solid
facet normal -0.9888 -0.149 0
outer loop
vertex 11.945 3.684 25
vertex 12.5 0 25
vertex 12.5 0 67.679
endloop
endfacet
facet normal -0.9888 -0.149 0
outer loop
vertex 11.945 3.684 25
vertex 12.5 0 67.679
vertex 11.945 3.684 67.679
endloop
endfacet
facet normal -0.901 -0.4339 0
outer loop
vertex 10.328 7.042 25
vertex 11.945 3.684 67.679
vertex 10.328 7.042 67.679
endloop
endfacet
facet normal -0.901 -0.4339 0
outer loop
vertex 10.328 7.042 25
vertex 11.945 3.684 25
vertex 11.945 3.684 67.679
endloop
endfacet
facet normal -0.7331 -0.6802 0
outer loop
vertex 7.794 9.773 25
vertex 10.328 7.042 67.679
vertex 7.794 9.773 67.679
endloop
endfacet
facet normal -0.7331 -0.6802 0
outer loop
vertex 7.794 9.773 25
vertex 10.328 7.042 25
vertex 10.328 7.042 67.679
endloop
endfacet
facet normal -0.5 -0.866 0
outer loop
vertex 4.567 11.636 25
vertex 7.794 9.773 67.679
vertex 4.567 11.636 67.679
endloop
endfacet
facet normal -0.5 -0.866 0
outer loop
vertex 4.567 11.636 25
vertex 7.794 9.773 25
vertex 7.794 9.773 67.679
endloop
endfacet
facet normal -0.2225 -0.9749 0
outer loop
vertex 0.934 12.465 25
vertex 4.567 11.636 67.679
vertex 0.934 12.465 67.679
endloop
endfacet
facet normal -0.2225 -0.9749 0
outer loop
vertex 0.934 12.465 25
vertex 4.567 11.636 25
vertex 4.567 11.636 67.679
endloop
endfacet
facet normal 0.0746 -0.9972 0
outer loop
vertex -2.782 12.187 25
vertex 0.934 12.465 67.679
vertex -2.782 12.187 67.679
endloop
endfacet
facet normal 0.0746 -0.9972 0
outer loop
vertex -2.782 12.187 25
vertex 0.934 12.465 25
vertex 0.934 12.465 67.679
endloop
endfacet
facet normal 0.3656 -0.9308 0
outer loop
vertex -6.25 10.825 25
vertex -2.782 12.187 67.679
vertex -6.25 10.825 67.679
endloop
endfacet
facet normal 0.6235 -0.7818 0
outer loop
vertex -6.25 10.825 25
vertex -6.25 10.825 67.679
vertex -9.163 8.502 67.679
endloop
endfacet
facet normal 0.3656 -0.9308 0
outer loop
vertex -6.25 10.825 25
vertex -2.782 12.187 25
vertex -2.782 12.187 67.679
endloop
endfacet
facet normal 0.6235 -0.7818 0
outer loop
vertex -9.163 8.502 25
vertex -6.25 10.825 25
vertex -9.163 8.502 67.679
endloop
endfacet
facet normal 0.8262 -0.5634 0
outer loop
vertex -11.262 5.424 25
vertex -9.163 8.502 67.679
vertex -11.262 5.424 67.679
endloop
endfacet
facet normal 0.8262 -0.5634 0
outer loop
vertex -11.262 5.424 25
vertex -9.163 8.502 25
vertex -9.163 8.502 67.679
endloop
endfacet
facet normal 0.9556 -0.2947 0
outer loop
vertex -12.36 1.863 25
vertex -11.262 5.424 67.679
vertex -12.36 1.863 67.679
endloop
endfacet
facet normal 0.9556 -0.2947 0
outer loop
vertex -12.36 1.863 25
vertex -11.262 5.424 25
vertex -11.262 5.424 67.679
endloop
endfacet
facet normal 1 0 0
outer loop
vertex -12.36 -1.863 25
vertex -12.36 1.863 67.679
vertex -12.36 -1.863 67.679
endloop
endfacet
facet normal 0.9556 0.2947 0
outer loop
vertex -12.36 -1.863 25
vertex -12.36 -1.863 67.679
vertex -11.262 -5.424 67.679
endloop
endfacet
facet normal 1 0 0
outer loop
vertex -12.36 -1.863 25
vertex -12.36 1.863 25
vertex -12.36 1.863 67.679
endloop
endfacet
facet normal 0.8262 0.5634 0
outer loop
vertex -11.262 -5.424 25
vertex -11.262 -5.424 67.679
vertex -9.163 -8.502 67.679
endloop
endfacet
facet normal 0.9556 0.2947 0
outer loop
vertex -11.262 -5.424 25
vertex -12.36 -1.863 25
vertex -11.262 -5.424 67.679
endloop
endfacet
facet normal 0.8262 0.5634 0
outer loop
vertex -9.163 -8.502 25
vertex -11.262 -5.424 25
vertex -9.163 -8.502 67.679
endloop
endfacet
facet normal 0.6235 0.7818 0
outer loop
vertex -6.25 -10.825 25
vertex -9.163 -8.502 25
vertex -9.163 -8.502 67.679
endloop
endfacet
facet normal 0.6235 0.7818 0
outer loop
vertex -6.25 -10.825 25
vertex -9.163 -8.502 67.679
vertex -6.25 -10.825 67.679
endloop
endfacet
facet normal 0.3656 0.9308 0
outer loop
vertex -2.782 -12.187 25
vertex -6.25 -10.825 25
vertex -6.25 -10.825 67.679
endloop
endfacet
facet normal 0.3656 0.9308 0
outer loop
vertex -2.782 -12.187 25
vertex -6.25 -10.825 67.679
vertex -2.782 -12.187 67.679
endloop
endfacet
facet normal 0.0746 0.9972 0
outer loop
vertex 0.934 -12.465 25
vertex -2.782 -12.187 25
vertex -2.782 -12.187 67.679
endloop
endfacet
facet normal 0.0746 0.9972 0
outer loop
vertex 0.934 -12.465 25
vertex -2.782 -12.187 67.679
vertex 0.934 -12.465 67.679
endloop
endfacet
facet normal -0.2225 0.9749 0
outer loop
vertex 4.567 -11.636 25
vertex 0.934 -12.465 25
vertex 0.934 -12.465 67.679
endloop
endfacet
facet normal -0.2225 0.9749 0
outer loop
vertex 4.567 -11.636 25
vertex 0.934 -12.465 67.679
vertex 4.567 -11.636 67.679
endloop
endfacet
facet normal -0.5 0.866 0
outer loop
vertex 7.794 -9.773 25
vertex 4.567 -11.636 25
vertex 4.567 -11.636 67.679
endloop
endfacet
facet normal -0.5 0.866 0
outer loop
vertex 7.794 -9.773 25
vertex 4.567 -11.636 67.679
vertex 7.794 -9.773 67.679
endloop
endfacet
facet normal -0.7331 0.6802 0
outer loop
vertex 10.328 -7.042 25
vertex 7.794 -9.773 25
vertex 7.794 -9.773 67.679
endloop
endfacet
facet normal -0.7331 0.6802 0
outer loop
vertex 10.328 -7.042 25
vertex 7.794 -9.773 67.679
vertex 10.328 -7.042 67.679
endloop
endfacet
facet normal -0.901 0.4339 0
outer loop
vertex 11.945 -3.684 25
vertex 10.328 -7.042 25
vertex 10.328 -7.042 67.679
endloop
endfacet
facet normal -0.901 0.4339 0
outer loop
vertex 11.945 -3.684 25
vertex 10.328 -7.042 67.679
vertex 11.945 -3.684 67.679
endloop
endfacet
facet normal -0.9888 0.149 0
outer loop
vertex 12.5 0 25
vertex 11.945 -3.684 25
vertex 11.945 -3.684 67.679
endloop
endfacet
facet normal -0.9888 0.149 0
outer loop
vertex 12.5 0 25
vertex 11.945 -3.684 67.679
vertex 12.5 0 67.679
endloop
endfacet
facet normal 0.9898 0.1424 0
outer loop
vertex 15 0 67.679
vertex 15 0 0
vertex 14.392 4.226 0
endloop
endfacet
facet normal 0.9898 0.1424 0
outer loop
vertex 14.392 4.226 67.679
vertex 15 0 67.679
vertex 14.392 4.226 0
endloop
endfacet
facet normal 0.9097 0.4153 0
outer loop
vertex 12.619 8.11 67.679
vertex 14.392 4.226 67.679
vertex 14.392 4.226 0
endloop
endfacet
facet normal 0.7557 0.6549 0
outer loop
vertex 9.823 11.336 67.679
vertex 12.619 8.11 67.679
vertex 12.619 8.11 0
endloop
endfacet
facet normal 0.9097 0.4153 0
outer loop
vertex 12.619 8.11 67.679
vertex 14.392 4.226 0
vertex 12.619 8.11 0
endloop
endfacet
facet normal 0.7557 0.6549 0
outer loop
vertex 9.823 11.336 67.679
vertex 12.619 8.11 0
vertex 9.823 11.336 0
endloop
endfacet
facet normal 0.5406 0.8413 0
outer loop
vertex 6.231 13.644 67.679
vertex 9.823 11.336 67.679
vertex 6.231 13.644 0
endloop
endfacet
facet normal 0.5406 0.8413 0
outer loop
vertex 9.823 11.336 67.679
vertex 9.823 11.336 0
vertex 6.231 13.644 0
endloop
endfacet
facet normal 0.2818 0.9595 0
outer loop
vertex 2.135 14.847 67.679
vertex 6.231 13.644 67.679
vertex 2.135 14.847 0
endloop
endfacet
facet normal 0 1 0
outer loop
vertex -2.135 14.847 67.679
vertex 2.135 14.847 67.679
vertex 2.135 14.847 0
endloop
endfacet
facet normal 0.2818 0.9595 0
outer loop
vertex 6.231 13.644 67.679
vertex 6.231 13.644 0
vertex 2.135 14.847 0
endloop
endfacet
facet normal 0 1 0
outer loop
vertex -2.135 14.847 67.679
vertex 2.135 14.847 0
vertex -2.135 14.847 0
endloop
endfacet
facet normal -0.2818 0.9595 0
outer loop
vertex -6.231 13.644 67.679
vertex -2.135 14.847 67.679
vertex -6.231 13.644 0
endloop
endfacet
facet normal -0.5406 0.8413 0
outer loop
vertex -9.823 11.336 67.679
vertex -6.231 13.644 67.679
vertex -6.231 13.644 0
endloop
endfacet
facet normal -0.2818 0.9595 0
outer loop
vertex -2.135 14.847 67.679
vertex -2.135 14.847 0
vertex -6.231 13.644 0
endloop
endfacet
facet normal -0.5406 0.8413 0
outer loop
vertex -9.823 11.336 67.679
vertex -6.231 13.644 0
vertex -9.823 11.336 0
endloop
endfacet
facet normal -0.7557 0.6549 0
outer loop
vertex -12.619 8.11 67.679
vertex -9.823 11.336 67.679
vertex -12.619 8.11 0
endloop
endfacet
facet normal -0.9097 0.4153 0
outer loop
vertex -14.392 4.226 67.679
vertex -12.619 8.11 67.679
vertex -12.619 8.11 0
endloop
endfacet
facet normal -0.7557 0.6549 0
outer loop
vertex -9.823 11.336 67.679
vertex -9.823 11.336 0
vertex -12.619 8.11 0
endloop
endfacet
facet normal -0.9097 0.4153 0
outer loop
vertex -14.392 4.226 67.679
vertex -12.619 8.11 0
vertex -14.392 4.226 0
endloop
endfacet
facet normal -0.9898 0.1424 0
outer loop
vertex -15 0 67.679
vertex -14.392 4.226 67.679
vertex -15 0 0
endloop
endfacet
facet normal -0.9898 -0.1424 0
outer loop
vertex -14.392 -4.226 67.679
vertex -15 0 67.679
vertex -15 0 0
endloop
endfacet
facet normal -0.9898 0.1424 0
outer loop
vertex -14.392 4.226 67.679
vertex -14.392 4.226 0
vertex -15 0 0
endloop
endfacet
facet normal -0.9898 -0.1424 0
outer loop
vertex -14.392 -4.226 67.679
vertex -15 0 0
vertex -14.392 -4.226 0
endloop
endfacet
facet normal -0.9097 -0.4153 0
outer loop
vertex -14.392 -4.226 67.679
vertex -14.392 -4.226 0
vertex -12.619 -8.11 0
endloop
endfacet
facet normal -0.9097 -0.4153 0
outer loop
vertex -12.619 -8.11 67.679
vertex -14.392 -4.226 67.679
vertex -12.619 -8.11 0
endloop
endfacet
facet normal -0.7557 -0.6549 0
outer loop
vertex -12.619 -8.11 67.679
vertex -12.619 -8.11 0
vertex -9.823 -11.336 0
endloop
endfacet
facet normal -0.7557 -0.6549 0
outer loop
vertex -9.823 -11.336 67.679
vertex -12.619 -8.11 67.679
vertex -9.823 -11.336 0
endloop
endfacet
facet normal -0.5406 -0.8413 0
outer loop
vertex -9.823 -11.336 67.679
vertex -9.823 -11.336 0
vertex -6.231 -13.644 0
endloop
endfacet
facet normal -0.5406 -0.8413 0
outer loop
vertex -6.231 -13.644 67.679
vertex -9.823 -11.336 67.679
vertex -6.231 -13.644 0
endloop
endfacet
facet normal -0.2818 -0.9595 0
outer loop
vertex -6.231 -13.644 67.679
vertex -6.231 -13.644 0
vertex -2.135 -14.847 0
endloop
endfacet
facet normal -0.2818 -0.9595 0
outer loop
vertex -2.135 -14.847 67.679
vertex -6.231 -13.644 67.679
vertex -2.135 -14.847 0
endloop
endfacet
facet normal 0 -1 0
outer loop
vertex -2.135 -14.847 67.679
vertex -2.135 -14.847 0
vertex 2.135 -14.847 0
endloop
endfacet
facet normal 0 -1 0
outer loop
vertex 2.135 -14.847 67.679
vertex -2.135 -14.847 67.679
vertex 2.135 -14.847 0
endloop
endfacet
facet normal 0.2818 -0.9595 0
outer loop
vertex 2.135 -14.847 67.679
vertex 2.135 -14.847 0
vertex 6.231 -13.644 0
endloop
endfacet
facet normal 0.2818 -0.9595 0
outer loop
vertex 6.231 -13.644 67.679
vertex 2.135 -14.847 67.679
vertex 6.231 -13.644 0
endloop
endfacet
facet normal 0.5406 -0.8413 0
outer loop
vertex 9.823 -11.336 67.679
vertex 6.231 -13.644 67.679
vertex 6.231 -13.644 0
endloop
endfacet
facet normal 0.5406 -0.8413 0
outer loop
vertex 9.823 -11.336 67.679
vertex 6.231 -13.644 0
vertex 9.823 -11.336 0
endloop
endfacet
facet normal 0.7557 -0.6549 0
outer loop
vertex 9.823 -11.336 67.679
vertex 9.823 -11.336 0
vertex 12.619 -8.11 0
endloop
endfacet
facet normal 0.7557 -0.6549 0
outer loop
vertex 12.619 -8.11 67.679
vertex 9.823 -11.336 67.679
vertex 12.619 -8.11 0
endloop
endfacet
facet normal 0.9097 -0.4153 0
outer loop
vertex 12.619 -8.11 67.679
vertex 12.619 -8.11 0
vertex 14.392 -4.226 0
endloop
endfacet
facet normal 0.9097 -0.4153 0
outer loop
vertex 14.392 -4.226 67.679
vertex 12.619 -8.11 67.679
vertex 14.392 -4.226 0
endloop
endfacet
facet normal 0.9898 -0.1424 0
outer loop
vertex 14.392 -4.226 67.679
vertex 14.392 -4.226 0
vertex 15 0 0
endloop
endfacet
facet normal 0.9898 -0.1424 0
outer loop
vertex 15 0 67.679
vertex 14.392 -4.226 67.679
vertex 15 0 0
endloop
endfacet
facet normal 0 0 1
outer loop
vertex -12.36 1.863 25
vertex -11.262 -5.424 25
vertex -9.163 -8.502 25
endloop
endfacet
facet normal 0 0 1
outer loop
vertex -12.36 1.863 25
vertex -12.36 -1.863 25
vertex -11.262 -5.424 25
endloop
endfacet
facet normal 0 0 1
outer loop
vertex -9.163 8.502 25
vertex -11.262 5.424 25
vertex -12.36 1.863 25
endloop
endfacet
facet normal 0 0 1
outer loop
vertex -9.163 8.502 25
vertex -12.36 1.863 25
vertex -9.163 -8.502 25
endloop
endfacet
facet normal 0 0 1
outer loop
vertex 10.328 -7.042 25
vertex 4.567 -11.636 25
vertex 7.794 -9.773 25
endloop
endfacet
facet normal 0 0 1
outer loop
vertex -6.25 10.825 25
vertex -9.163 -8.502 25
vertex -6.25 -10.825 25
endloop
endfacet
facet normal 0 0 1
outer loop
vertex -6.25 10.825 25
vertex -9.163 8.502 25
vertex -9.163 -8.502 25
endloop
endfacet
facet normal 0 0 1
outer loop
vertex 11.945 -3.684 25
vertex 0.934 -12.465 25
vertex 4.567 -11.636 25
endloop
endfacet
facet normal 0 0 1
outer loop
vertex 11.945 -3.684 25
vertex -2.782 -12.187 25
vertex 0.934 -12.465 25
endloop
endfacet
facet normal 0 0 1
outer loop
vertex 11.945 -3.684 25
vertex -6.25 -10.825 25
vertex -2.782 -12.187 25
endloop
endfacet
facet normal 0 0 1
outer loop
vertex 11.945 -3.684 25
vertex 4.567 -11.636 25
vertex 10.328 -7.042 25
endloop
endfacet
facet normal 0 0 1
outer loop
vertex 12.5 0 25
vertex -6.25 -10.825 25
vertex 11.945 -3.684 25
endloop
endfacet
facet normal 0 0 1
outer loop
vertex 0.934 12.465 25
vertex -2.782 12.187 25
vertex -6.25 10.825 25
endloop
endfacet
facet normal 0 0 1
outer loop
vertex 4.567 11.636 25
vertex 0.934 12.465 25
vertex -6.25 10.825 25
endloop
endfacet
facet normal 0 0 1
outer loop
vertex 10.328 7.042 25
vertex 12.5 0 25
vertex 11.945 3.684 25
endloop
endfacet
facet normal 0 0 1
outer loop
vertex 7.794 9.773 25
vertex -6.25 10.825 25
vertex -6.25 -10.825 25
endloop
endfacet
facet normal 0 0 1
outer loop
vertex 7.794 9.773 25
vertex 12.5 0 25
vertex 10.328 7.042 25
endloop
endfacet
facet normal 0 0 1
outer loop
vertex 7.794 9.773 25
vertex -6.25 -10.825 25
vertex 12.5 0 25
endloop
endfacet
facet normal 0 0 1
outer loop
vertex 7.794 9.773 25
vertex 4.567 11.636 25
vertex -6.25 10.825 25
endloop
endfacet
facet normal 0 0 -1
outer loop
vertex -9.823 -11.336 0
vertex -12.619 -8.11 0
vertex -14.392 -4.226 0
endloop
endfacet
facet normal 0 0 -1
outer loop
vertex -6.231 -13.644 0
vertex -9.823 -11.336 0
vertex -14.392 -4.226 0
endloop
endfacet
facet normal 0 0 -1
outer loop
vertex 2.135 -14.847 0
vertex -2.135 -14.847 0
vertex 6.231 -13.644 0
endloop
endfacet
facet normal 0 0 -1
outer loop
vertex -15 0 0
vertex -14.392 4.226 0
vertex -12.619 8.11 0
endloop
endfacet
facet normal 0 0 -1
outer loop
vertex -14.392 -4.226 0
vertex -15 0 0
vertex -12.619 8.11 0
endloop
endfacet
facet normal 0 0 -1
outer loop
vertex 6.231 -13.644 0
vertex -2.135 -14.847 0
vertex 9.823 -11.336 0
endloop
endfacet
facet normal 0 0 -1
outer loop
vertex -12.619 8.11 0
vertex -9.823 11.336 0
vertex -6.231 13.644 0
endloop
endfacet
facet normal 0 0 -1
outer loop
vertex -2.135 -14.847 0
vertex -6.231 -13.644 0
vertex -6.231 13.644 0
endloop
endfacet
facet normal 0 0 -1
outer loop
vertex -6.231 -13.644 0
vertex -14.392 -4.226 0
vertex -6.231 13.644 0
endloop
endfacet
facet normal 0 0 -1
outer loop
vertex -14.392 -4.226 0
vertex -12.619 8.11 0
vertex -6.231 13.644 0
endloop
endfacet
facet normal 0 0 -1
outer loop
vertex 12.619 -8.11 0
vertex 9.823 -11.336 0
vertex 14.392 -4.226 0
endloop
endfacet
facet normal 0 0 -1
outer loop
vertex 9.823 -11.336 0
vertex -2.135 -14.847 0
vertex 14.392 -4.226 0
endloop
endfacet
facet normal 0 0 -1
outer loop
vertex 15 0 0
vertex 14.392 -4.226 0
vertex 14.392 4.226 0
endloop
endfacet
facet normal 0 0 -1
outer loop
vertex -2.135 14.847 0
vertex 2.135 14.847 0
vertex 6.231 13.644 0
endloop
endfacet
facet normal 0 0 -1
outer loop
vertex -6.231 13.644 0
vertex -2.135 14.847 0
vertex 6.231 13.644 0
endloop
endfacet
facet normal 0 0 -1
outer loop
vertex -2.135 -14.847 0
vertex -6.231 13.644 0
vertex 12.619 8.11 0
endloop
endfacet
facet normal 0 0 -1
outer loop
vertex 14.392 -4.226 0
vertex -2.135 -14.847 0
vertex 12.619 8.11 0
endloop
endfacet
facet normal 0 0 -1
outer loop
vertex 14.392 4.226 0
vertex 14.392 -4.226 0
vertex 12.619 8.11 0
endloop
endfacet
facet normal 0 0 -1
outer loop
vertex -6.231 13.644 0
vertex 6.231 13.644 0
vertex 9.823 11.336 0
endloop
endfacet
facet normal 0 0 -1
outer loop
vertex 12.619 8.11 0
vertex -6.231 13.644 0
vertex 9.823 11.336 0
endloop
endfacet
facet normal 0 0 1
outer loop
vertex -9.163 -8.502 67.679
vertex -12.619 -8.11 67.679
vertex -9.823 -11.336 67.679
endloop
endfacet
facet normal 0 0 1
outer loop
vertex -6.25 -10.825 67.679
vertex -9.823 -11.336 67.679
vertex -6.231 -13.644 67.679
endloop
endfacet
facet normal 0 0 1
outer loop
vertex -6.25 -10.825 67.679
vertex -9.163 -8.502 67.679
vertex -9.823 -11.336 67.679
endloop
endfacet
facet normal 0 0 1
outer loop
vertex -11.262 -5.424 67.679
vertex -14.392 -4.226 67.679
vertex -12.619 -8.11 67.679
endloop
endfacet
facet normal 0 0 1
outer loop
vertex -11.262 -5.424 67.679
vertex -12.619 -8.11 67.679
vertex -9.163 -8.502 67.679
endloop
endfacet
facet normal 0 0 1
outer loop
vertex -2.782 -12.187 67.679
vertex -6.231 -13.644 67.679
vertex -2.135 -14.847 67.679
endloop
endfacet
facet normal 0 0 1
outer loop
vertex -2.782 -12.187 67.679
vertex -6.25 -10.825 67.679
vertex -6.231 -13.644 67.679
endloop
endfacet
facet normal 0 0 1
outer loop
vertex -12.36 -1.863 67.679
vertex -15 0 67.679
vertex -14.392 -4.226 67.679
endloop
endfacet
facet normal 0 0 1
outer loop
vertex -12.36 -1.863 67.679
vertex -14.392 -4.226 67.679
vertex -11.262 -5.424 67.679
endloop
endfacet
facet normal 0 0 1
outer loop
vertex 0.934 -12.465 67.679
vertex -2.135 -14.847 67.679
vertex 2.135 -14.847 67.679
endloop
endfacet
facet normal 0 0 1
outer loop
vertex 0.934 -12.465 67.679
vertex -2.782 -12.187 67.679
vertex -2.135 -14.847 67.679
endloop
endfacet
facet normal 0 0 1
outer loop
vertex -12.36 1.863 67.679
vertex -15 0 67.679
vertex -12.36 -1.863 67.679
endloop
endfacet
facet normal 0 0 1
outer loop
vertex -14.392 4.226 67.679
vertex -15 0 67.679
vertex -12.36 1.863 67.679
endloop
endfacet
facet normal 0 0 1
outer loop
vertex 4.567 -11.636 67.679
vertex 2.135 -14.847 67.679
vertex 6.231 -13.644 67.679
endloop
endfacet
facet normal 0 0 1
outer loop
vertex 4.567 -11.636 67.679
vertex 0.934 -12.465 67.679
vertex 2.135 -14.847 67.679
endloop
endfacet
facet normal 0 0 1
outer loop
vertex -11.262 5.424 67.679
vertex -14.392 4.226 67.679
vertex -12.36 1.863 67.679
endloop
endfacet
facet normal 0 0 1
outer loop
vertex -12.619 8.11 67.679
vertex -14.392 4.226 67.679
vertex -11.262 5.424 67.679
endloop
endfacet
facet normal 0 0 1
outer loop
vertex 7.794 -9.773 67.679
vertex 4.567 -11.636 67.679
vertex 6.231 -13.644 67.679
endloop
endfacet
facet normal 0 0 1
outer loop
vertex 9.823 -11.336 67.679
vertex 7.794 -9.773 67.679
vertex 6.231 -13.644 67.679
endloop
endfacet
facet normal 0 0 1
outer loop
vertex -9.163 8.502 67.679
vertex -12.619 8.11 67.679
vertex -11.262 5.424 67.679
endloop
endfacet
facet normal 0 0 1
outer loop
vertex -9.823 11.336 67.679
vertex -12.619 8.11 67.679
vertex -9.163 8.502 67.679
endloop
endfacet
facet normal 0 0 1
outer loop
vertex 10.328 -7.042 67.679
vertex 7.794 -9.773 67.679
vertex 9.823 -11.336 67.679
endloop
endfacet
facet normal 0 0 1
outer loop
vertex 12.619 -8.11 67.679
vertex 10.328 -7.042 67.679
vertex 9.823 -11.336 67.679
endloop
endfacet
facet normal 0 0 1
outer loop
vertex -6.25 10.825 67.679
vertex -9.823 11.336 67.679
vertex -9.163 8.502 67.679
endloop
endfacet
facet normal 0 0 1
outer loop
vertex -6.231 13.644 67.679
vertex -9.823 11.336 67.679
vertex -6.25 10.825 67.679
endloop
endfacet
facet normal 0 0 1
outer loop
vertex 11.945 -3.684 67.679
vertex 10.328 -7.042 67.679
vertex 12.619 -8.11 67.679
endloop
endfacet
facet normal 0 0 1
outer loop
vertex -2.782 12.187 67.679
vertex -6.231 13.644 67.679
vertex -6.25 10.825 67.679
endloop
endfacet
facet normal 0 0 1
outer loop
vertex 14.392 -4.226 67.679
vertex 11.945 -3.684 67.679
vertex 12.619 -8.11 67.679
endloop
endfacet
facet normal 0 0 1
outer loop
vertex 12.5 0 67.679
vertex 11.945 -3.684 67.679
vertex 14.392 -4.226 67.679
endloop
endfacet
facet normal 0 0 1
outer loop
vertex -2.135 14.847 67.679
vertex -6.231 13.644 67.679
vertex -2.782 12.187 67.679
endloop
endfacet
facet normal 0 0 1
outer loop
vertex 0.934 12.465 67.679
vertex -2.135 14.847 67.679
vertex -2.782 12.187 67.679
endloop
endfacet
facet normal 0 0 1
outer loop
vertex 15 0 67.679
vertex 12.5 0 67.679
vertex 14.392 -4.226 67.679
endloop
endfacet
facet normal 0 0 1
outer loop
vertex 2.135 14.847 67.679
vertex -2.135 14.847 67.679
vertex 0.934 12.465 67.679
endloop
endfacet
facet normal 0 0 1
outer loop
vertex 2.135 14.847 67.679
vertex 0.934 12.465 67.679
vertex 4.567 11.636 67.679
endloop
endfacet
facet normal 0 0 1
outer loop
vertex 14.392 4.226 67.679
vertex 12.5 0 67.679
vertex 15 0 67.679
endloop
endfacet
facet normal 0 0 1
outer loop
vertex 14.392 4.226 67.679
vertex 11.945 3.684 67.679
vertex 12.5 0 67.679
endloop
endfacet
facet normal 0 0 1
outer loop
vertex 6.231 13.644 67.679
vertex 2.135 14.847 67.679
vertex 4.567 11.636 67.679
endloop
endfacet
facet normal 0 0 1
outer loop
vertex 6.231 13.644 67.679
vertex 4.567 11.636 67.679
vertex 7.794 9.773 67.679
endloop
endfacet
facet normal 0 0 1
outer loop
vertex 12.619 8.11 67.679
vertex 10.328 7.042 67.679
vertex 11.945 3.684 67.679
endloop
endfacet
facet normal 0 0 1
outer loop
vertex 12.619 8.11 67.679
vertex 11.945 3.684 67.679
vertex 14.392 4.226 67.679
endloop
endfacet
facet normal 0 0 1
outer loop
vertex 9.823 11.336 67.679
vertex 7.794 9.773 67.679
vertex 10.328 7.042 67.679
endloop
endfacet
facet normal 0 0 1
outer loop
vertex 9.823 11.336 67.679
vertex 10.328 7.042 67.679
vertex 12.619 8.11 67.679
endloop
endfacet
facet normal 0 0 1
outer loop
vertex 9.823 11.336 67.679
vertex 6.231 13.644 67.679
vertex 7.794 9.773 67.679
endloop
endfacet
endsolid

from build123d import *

# Parameters (mm, degrees)
F1_R     = 15
F2_DEPTH = 67.678692
F3_T     = -2.5
F0_R     = 15
F4_DEPTH = 25


with BuildPart() as f2:
    # F1 (on face) → F2 (new body)
    with BuildSketch(Plane.XY):
        Circle(F1_R)
    extrude(amount=F2_DEPTH)

    # F3
    f3_openings = [f2.faces().sort_by_distance(p)[0] for p in [
        (0, 0, 67.678692),
    ]]
    offset(amount=F3_T, openings=f3_openings)

    # F0 (on Top) → F4 (join)
    with BuildSketch(Plane.XY):
        Circle(F0_R)
    extrude(amount=F4_DEPTH)


solid = f2.part
